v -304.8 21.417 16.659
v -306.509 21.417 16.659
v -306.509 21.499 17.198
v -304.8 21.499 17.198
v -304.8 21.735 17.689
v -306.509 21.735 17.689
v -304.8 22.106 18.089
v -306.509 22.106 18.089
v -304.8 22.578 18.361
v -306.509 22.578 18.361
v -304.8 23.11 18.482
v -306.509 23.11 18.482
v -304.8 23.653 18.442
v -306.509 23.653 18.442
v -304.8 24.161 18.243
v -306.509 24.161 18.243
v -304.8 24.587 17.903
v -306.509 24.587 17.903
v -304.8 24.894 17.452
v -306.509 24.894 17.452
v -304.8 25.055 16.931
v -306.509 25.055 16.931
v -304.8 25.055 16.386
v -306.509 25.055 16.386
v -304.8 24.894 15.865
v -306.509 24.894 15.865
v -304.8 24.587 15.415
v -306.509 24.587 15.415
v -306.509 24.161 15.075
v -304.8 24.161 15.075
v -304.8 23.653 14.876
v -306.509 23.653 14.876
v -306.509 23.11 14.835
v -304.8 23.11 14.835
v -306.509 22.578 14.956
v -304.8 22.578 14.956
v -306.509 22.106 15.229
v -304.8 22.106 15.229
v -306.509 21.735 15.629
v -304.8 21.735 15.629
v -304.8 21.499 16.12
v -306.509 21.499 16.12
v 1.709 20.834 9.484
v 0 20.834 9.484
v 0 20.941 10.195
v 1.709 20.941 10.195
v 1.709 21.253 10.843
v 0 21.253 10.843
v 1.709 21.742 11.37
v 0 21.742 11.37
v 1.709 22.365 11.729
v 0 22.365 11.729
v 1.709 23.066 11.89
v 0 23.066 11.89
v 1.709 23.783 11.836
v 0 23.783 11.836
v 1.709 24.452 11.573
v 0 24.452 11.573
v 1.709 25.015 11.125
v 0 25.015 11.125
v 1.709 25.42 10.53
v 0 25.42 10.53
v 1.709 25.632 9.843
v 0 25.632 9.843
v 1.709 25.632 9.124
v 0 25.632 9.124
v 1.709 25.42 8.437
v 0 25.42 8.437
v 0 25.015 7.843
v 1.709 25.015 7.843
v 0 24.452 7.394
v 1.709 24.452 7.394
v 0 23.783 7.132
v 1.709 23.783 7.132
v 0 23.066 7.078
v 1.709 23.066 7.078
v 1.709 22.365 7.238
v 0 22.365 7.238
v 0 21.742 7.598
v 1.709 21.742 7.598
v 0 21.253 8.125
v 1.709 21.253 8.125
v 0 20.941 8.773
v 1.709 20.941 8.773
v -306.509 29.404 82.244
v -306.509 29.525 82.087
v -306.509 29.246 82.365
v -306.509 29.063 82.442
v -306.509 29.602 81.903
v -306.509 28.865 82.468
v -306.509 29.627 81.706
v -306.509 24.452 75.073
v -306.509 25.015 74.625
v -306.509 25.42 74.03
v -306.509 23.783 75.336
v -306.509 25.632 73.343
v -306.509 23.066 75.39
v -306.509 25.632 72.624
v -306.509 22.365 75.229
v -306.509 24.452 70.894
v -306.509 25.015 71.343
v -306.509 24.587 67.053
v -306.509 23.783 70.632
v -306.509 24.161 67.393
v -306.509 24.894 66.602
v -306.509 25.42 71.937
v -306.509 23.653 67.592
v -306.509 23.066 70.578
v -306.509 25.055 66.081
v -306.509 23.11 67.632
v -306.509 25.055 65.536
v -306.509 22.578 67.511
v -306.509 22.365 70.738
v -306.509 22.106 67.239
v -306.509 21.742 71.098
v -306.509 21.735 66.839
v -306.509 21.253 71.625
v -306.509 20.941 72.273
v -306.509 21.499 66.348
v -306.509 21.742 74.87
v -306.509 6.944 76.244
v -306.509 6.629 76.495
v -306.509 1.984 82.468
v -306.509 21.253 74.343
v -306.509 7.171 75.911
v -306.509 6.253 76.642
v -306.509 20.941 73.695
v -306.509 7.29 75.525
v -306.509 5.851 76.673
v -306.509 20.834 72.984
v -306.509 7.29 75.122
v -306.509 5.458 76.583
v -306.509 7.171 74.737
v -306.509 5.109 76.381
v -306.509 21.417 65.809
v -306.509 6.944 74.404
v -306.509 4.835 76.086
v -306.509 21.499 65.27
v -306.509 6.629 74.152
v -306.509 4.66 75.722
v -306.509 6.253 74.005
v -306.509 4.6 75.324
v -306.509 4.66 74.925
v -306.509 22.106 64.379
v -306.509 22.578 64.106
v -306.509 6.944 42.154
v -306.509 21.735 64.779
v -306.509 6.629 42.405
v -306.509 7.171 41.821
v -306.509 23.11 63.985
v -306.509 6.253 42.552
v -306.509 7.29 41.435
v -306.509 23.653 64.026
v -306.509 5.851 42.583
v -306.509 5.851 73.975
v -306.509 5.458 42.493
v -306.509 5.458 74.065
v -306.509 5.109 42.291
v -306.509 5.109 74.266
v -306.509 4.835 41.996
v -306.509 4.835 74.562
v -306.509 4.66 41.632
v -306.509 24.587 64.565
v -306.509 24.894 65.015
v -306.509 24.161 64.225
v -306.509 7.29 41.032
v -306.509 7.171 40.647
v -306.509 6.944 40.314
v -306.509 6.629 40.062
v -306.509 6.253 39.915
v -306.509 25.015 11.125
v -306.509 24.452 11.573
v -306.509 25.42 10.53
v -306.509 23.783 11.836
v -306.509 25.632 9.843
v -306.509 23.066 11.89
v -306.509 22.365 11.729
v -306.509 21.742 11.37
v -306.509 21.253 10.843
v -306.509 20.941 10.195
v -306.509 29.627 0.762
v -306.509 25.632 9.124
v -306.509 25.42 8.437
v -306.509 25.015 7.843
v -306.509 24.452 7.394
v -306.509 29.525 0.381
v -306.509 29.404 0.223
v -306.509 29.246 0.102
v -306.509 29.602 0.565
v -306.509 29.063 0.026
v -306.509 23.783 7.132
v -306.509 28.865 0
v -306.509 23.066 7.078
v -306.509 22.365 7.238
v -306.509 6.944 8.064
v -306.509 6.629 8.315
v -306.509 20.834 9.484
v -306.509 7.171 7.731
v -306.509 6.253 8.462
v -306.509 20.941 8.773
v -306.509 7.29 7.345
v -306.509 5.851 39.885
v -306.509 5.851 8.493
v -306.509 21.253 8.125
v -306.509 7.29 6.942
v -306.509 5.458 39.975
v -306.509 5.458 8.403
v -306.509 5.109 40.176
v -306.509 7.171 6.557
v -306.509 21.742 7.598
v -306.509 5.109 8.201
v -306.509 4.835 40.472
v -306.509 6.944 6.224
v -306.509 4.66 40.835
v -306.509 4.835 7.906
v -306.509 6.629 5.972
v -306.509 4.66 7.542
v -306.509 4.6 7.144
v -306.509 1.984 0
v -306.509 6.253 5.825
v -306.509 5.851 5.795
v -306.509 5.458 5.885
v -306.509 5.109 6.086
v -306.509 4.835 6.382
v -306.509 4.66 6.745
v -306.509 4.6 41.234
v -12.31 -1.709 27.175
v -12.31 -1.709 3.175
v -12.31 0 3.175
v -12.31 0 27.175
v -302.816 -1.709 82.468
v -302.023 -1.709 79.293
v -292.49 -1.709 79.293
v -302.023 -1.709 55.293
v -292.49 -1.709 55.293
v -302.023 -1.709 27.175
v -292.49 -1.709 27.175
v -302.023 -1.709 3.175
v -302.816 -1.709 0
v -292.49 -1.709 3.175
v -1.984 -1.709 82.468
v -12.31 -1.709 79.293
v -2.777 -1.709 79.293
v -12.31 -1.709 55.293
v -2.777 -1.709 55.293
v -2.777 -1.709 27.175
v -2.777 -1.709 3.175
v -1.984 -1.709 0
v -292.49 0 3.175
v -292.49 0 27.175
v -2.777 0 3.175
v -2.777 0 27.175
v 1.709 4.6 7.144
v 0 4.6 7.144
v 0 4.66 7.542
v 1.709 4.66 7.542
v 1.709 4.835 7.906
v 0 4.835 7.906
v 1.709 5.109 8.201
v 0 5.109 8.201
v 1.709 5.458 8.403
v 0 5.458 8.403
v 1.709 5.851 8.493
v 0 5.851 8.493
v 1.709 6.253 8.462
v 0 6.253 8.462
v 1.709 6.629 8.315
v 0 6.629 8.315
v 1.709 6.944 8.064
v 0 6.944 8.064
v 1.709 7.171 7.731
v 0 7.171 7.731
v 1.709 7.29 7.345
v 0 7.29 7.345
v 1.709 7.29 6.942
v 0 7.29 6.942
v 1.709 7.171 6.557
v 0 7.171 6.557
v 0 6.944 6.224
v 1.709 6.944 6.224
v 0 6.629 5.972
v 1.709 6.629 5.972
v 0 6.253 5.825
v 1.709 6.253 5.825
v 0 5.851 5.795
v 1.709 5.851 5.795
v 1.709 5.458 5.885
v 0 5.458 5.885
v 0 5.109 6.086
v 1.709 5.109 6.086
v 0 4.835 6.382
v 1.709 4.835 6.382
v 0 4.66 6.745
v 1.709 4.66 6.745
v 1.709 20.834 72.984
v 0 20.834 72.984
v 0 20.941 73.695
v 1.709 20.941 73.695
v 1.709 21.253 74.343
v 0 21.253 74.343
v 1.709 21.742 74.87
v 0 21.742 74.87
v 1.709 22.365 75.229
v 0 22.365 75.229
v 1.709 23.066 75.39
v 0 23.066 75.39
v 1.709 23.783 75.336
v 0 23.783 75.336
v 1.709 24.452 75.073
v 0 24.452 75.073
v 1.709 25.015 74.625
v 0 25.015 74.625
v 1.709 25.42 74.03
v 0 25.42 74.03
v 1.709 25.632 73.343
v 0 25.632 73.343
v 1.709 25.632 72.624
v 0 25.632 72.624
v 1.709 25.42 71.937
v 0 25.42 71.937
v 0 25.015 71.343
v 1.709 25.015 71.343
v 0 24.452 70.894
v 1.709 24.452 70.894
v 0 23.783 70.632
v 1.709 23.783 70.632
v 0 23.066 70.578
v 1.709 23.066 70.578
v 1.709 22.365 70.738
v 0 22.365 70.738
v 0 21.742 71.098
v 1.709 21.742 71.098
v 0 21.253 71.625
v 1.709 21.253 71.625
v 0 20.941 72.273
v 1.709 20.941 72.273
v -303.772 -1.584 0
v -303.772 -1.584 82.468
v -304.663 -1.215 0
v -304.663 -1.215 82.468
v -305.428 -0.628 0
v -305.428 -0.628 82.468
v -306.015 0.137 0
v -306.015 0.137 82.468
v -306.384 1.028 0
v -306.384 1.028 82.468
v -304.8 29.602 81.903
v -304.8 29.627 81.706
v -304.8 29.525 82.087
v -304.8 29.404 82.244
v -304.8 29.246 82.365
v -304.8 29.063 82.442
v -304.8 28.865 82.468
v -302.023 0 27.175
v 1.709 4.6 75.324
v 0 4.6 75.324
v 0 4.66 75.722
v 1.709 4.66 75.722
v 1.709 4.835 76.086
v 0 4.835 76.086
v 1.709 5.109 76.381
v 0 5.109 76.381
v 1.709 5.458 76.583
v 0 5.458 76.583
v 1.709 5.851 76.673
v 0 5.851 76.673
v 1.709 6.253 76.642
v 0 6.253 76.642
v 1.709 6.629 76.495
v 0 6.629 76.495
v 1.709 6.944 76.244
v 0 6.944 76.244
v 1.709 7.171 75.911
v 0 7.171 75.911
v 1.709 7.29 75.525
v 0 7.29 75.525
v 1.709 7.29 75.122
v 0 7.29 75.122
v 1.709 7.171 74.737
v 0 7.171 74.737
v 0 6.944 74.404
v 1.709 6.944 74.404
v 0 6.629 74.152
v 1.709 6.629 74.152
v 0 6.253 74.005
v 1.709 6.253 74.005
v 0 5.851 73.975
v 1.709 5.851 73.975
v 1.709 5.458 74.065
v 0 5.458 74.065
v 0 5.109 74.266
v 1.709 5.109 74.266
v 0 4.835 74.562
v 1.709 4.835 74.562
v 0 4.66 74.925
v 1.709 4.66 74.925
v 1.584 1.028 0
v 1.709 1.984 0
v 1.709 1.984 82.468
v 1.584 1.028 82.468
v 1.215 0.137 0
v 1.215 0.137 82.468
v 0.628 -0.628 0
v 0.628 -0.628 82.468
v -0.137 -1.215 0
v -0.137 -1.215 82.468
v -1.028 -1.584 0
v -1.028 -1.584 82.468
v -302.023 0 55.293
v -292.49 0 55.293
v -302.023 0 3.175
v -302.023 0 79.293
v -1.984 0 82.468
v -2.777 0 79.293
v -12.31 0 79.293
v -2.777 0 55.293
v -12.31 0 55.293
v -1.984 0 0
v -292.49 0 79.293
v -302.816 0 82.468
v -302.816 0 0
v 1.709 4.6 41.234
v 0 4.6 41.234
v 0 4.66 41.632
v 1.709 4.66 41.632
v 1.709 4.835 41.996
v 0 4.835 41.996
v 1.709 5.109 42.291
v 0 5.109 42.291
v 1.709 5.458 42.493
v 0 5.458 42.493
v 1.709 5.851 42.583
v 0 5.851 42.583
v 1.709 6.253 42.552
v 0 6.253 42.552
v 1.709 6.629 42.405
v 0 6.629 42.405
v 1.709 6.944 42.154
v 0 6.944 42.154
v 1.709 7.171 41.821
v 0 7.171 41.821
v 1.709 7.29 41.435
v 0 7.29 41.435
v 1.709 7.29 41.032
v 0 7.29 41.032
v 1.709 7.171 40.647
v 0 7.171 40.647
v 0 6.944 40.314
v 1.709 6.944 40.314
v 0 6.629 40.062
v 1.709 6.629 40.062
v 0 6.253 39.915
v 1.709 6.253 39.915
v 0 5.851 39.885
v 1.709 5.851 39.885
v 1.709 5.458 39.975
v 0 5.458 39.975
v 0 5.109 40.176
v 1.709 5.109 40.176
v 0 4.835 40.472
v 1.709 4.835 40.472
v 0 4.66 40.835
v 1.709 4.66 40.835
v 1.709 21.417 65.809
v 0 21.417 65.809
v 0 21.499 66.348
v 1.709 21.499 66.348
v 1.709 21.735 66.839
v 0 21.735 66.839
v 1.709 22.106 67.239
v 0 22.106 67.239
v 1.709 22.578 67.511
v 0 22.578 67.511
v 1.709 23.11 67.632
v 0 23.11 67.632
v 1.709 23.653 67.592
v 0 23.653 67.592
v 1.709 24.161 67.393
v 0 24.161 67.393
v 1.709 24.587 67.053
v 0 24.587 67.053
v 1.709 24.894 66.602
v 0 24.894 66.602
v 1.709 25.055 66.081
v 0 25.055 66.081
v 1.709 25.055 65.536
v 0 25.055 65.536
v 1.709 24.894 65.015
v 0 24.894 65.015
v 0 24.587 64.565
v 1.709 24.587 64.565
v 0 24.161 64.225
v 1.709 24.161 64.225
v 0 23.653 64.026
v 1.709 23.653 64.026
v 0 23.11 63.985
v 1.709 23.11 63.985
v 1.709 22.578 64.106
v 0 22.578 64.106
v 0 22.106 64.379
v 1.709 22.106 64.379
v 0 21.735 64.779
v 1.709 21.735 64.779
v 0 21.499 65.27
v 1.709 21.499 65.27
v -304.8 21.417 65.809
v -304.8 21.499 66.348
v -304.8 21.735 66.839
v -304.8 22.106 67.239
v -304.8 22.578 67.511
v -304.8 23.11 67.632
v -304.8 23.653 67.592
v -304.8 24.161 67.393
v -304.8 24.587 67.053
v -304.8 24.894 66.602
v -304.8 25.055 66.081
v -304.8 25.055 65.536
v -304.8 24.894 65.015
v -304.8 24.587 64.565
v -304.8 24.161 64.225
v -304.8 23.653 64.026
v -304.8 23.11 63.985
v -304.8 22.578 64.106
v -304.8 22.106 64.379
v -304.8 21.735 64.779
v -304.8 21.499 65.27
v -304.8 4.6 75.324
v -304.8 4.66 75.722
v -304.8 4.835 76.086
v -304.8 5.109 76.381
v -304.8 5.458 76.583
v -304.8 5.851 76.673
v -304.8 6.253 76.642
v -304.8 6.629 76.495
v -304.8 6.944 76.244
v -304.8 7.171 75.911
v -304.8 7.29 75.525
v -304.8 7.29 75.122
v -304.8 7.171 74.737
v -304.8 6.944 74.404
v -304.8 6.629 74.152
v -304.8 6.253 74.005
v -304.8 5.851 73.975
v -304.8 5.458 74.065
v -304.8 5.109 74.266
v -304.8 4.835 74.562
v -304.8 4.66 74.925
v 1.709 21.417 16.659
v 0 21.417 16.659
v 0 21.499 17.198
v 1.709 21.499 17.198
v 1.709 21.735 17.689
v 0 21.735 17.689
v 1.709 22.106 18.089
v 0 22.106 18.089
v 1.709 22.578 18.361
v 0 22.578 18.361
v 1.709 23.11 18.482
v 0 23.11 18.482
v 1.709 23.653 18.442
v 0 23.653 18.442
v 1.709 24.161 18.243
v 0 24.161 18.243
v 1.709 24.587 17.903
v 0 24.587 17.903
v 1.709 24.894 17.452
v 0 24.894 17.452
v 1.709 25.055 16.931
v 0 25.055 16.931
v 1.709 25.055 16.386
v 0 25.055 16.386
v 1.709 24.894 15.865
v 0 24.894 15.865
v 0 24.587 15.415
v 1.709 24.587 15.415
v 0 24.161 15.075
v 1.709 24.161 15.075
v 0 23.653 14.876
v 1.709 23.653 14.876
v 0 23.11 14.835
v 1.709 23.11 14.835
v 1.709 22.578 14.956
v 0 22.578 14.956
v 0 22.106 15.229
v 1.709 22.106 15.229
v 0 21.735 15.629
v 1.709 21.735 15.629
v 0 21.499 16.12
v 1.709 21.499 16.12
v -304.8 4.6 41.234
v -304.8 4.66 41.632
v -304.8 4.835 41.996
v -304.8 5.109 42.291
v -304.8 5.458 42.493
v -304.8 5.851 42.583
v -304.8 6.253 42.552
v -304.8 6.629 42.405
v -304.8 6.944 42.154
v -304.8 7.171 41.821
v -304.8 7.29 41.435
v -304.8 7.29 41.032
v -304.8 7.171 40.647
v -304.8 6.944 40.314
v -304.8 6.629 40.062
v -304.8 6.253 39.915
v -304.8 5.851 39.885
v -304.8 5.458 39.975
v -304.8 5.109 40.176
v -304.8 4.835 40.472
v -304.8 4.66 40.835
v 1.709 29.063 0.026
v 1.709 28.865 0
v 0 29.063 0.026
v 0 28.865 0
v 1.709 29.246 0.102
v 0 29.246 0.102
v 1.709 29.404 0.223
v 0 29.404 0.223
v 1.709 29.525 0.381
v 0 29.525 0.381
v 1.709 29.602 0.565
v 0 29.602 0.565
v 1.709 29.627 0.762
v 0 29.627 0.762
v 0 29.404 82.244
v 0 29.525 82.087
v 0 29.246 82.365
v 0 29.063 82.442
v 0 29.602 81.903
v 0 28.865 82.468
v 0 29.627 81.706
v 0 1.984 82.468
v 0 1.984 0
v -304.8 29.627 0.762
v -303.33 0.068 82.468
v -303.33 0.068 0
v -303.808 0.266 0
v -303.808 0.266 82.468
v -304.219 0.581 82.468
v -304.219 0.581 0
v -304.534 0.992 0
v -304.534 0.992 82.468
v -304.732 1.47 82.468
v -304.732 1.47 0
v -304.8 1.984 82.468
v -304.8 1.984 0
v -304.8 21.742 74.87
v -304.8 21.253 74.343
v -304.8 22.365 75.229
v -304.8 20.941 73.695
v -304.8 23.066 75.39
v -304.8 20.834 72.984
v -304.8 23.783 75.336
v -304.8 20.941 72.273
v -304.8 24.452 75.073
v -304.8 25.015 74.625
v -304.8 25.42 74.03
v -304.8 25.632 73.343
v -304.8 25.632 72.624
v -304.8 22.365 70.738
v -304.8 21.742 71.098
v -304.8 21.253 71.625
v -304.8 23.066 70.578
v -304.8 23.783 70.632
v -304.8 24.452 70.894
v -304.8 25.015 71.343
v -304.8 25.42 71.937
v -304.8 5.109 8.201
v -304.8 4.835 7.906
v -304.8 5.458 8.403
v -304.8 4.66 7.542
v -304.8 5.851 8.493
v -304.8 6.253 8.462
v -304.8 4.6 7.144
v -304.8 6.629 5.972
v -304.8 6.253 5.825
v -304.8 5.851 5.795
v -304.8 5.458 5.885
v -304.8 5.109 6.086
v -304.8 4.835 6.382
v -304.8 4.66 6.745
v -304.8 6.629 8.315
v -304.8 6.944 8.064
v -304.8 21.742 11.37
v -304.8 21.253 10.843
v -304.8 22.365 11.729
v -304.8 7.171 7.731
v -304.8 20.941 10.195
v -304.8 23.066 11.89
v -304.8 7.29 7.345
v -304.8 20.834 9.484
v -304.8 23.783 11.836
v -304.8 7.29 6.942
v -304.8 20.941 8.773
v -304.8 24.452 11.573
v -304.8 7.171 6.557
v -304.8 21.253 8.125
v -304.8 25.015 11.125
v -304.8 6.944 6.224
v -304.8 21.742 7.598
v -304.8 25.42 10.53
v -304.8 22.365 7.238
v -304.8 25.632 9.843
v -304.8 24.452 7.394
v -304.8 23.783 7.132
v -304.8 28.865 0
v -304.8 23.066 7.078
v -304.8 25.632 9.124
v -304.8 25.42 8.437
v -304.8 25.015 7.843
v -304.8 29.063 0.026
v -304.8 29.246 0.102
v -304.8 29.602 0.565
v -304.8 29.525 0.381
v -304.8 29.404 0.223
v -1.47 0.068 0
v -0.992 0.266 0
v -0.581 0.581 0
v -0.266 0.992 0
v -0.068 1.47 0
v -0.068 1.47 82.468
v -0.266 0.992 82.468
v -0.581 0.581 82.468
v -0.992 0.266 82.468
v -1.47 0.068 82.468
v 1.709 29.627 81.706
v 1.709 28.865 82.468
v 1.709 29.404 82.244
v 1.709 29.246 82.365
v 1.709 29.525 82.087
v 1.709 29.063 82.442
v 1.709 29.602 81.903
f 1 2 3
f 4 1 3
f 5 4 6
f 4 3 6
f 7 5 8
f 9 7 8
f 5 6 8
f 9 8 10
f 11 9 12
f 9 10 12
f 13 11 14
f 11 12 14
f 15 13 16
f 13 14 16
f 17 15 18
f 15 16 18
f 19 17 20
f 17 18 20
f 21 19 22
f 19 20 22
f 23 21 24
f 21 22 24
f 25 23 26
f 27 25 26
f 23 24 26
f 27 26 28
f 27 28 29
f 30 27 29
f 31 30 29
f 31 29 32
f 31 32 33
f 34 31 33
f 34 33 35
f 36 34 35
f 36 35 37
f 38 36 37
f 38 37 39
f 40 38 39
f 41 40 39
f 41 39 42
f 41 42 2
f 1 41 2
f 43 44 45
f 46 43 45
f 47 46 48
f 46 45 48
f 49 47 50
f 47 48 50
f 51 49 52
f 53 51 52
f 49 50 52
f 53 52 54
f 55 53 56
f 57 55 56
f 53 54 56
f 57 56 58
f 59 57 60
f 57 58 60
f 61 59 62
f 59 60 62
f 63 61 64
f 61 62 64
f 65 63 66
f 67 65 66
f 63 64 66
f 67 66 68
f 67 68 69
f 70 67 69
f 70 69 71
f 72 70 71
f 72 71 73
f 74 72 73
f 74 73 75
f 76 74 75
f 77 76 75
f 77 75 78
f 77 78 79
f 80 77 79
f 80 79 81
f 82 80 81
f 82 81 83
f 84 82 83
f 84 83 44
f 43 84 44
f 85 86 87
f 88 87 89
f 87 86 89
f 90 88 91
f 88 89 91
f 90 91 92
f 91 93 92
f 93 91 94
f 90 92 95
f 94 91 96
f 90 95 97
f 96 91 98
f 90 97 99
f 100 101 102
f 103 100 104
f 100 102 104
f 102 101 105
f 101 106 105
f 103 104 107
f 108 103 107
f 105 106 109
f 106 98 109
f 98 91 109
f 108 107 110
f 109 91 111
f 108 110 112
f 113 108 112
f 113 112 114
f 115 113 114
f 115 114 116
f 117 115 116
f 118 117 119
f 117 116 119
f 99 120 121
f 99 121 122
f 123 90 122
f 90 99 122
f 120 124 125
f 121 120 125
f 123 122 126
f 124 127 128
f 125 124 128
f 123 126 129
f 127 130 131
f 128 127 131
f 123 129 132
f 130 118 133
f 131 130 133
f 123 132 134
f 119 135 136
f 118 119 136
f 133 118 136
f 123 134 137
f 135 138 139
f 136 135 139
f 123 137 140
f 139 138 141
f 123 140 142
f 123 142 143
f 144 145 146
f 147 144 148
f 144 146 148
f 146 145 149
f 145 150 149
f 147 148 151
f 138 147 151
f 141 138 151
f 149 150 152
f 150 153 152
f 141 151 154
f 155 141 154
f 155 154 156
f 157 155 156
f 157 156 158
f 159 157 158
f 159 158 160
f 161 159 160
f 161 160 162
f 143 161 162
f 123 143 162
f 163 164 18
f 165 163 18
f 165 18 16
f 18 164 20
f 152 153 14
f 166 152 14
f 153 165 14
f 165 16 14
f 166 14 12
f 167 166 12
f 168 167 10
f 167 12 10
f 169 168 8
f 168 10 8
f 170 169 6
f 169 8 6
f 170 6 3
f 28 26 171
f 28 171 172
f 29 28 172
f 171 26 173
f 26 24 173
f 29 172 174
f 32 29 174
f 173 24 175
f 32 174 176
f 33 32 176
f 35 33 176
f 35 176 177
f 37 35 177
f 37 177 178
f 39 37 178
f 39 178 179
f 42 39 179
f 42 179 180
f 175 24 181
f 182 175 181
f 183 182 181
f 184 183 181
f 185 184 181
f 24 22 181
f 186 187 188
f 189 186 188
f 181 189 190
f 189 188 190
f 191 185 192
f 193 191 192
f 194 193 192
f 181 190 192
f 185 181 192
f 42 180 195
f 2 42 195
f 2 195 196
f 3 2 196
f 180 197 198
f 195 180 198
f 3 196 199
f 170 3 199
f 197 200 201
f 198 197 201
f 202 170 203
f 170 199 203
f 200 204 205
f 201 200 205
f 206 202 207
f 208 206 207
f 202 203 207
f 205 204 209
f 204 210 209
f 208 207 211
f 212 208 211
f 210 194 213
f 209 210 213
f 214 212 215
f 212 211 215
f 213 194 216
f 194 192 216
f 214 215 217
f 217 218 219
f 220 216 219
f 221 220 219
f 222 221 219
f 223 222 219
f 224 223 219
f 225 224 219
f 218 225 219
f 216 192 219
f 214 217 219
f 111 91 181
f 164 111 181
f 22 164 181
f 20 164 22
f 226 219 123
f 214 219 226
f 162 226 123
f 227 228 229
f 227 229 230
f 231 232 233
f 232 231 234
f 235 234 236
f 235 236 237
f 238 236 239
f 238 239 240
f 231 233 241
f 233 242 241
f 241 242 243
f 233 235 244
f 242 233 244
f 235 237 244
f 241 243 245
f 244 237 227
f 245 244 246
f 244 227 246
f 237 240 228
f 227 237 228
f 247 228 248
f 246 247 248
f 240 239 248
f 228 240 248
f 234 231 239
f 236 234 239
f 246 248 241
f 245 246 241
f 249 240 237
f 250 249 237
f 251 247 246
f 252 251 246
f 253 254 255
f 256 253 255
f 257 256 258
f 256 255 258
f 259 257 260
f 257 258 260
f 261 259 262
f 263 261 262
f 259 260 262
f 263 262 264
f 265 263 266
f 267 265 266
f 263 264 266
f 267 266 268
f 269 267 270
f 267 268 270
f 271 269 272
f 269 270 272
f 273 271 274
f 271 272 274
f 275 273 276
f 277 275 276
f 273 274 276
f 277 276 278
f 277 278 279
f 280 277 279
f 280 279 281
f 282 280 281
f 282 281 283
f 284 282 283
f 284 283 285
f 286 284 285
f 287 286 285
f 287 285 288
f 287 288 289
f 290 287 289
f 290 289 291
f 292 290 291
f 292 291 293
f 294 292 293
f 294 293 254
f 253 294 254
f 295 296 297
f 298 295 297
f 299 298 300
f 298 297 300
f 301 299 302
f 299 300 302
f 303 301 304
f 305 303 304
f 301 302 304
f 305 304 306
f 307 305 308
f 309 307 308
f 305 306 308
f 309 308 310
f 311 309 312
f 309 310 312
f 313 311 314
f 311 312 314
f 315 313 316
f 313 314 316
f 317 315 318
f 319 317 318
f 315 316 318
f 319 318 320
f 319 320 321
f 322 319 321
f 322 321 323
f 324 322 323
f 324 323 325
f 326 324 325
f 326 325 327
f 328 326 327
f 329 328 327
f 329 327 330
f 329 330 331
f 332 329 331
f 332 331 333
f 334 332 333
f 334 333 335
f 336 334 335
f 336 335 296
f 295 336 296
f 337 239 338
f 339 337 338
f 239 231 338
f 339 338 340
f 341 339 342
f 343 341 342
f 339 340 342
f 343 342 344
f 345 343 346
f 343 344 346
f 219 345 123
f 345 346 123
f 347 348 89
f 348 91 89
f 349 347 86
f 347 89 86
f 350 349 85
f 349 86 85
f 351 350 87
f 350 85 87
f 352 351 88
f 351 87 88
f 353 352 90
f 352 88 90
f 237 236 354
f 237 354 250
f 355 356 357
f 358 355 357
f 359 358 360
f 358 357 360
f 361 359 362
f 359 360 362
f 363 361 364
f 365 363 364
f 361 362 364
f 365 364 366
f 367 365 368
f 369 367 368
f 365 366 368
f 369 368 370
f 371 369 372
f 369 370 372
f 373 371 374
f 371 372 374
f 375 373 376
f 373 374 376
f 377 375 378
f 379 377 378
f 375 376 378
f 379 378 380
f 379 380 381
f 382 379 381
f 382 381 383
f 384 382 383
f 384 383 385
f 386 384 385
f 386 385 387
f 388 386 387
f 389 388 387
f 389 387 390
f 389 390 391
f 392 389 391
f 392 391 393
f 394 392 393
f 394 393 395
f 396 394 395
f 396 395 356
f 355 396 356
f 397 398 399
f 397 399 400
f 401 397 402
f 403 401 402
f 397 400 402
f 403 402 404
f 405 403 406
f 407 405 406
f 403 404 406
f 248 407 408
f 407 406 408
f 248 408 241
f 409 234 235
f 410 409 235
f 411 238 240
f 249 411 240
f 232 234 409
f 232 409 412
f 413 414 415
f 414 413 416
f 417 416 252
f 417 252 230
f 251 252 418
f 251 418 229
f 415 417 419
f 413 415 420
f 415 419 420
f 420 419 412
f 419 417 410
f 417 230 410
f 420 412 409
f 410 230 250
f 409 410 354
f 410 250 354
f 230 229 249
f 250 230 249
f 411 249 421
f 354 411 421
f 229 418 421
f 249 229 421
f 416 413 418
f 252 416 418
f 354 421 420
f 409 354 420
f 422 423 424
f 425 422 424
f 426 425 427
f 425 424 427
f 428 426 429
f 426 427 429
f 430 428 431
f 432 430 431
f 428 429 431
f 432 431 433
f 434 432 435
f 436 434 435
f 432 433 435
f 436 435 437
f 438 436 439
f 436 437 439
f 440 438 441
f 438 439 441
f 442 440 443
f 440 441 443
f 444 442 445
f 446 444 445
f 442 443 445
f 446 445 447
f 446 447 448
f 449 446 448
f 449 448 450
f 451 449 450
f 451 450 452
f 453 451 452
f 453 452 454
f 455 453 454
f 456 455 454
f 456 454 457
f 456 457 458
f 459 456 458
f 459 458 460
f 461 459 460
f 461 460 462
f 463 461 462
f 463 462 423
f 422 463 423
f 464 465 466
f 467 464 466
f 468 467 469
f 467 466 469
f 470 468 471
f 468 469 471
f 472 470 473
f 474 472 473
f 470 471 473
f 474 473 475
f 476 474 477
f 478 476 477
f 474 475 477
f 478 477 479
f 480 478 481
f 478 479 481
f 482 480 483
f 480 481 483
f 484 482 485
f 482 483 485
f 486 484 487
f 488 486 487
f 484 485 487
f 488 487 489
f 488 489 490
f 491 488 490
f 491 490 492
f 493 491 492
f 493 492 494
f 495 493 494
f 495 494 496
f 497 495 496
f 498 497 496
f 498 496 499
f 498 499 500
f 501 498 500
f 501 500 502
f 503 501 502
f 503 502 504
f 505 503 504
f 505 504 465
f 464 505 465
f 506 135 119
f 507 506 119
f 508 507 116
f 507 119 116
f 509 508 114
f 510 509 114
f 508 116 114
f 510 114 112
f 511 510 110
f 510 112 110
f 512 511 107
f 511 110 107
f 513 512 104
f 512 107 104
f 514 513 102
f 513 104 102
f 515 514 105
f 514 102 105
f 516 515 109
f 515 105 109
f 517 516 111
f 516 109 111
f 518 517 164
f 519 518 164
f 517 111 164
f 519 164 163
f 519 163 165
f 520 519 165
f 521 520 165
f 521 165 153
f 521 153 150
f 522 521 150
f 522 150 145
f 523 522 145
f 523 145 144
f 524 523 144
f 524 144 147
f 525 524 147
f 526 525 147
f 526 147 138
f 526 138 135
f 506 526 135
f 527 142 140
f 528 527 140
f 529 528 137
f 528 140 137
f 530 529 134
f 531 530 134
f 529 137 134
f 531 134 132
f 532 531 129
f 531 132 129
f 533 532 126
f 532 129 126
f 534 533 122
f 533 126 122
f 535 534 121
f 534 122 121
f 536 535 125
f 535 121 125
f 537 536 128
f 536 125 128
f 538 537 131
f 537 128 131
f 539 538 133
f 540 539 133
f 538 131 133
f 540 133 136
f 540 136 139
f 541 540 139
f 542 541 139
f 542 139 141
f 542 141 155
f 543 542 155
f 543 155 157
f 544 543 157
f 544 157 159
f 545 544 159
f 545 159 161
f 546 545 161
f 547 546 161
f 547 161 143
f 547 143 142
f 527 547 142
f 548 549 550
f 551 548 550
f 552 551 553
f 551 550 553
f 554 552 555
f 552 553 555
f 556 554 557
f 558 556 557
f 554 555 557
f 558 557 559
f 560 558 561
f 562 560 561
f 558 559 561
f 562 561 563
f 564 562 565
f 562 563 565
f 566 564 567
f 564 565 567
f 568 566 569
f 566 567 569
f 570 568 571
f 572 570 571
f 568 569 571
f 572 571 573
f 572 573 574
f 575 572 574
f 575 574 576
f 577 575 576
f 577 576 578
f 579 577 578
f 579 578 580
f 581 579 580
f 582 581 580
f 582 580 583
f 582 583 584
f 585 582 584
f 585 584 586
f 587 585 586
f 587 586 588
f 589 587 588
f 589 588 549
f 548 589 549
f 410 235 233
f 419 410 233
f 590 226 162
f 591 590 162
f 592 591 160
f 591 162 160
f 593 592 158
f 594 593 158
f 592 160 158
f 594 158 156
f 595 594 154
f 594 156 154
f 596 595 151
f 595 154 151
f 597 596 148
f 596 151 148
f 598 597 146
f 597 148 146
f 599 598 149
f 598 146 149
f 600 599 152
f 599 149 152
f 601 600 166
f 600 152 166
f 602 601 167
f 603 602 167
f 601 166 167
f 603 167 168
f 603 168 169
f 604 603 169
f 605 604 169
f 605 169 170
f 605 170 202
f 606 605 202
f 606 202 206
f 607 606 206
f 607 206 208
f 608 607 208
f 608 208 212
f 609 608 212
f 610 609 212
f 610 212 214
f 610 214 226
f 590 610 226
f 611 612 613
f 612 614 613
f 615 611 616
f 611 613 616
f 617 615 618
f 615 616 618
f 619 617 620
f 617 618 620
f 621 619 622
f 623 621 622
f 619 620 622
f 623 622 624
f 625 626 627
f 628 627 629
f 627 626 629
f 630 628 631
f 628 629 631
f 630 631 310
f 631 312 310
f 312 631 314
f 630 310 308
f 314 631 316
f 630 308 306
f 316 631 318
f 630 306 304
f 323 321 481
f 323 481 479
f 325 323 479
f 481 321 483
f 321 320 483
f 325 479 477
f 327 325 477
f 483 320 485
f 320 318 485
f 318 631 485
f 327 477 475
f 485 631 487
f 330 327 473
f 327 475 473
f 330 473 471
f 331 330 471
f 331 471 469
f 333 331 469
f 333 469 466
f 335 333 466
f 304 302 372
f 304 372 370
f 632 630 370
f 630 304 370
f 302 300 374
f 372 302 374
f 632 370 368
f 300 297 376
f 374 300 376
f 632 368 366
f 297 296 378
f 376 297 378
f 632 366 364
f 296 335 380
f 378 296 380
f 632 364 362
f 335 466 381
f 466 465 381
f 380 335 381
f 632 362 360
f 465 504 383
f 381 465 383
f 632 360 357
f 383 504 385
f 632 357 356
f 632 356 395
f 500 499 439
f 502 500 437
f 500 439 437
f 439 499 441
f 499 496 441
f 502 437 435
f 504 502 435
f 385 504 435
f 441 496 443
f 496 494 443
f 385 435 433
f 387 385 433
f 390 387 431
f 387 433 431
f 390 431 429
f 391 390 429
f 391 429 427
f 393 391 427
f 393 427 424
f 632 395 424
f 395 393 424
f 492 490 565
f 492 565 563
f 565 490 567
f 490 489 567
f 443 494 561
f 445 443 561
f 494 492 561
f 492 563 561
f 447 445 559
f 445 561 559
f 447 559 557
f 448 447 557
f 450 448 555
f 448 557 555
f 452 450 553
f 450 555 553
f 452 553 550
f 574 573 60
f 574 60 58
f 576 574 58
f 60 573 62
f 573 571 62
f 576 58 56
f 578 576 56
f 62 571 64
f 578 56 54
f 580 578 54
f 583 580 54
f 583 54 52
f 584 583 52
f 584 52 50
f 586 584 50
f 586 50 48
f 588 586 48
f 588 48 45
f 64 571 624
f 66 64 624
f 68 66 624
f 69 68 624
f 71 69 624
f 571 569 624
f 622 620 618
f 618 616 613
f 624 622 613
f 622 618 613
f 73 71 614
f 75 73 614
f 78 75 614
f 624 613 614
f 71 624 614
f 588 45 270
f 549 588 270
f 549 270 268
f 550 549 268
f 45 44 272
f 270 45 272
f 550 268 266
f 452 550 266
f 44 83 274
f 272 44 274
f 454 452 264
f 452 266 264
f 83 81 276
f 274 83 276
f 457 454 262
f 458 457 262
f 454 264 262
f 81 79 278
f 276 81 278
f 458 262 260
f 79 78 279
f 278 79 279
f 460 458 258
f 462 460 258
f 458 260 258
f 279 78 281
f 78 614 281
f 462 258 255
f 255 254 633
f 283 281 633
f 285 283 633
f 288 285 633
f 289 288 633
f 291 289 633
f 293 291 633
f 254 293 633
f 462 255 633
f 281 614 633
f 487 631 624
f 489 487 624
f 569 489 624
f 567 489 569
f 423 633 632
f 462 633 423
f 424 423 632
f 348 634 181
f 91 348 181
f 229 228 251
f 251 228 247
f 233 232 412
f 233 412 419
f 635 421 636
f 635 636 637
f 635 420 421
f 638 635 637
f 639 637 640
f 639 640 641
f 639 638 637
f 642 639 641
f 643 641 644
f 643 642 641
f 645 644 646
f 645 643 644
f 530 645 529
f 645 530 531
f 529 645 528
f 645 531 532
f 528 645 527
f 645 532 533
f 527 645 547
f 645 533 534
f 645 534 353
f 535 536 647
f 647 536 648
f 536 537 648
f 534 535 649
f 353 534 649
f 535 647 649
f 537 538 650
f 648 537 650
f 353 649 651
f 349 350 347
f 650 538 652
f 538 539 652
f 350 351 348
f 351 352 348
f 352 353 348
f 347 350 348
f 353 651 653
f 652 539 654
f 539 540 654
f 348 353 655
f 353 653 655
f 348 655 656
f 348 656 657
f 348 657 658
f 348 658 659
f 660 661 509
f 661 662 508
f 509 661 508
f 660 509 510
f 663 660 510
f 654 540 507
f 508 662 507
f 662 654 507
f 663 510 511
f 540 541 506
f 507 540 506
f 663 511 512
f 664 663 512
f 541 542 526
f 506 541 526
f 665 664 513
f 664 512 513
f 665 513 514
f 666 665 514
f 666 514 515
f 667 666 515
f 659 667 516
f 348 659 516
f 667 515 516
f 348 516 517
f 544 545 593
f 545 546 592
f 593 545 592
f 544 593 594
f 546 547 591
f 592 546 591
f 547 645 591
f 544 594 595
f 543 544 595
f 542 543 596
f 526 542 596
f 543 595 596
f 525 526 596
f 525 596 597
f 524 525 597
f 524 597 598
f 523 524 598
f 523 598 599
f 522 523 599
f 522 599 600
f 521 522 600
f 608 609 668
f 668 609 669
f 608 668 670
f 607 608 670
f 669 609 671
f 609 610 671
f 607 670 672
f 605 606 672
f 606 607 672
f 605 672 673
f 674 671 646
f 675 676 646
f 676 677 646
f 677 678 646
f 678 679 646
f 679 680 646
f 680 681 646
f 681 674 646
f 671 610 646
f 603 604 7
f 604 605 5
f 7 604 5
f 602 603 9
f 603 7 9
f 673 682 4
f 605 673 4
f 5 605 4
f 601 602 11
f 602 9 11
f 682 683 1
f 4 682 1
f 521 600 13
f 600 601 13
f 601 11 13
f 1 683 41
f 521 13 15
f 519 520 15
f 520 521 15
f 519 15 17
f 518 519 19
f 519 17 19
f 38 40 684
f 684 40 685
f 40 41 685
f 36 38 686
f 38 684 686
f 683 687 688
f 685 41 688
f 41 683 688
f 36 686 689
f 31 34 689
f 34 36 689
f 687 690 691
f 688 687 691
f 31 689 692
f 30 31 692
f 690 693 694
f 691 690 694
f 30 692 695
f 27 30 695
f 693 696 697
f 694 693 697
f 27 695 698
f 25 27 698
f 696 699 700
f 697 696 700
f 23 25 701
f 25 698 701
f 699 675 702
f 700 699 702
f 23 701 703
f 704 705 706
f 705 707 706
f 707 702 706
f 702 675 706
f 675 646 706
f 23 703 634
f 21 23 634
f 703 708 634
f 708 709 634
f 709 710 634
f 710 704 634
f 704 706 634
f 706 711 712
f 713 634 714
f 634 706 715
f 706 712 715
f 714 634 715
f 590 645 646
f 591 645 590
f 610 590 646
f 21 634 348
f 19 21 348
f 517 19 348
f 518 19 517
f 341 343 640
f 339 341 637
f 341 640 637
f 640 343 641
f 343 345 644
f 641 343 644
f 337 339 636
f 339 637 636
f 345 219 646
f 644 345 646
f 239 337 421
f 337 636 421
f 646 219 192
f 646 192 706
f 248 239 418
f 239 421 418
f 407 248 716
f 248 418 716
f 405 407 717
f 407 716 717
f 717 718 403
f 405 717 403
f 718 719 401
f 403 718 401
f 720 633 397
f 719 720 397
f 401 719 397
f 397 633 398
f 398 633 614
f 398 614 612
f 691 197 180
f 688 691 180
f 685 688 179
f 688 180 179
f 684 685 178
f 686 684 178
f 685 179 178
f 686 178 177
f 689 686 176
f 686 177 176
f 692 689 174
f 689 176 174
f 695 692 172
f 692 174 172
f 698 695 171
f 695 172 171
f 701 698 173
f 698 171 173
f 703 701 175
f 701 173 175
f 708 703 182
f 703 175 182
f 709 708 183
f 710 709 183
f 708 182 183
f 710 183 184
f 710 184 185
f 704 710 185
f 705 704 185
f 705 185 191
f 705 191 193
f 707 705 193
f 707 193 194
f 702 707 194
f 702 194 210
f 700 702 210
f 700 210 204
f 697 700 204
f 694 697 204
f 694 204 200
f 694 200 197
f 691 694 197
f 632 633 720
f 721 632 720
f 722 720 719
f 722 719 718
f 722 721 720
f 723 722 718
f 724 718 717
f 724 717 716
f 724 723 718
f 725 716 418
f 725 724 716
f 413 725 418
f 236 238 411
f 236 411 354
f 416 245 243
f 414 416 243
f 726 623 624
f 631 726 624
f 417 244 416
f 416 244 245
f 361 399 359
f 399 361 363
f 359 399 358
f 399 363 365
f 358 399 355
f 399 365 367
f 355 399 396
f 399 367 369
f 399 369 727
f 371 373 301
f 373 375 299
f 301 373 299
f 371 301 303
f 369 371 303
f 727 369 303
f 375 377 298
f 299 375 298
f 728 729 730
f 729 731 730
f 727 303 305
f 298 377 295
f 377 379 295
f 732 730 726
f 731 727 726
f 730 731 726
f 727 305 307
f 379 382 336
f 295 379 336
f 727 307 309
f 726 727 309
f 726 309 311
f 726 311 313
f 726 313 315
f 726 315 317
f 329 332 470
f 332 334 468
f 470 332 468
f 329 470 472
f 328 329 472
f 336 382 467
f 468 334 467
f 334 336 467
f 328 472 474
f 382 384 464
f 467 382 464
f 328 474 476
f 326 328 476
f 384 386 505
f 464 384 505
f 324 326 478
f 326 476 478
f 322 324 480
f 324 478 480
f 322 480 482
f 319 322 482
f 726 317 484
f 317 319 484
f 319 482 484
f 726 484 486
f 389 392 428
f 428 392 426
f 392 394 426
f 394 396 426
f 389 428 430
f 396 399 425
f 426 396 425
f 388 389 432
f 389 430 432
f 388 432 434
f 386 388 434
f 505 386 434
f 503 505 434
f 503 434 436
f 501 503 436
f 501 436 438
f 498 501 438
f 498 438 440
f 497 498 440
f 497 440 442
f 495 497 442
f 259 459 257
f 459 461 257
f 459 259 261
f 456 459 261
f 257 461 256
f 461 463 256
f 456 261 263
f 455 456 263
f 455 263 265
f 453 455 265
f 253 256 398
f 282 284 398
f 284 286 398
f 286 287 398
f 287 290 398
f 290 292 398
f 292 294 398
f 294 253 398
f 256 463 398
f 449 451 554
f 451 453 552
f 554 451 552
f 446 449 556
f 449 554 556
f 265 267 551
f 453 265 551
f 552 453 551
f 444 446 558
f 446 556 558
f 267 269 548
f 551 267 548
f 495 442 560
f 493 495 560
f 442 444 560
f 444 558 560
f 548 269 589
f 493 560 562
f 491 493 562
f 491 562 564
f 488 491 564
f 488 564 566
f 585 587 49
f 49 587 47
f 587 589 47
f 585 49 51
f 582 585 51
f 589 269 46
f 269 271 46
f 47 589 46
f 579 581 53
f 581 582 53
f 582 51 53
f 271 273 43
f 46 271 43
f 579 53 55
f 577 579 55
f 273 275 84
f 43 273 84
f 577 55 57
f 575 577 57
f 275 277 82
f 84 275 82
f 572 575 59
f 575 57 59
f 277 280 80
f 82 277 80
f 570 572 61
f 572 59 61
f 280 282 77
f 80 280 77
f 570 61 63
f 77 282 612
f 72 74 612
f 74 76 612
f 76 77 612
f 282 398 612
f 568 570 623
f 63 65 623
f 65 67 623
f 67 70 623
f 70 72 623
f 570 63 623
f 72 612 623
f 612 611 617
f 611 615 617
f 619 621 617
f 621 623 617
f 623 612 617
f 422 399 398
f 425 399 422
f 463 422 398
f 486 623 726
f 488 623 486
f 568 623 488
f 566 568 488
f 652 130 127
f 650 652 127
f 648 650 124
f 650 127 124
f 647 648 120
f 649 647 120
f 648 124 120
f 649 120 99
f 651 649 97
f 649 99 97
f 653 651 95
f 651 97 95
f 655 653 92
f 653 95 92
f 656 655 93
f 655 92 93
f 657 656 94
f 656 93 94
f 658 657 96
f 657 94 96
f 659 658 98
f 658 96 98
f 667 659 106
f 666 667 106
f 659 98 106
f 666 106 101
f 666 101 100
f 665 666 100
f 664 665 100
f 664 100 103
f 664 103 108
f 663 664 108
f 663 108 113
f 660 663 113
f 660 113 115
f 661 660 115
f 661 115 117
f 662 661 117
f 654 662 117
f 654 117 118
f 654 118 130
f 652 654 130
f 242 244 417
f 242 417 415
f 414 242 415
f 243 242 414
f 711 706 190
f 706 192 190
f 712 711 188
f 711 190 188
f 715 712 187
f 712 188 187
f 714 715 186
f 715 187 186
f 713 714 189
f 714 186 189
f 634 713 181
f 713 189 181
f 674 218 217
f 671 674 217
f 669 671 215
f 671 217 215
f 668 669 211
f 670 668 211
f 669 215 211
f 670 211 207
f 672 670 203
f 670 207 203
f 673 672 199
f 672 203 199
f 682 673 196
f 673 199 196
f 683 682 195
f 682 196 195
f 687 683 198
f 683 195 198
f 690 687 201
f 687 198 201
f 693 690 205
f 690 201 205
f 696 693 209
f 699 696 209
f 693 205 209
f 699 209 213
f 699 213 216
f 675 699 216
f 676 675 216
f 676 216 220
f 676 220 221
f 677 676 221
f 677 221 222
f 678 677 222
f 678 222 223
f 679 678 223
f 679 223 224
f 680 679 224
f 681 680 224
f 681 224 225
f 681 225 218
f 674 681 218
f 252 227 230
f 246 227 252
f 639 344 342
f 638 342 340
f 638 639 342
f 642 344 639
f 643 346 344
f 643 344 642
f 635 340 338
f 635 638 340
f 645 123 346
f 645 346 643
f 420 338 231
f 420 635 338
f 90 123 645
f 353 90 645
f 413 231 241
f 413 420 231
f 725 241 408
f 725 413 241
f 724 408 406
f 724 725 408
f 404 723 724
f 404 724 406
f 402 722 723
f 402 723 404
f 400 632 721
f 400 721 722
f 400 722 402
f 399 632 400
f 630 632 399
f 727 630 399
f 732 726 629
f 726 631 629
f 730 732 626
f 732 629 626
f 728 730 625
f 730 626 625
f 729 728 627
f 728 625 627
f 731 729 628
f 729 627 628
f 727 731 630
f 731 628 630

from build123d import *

# Parameters (mm, degrees)
F1_DEPTH = 82.467501
F2_R     = 1.98374
F3_R     = 3.69316
F4_R     = 2.4125
F4_R_2   = 1.8288
F4_R_3   = 1.35255
F5_DEPTH = 308.21884
F6_W     = 9.532925
F6_H     = 24
F7_DEPTH = 31.336894
F8_R     = 0.762


with BuildPart() as f1:
    # F0 (on Top) → F1 (new body)
    with BuildSketch(Plane.XY):
        Polygon((0, 29.627474), (0, 0), (-304.8, 0), (-304.8, 29.627474), (-306.50942, 29.627474), (-306.50942, -1.70942), (1.70942, -1.70942), (1.70942, 29.627474), align=None)
    extrude(amount=F1_DEPTH)

    # F2
    f2_edges = [f1.edges().sort_by_distance(p)[0] for p in [
        (0, 0, 41.23375),
        (-304.8, 0, 41.23375),
    ]]
    fillet(f2_edges, radius=F2_R)

    # F3
    f3_edges = [f1.edges().sort_by_distance(p)[0] for p in [
        (1.70942, -1.70942, 41.23375),
        (-306.50942, -1.70942, 41.23375),
    ]]
    fillet(f3_edges, radius=F3_R)

    # F4 (on face) → F5 (cut, through all)
    with BuildSketch(Plane(origin=(-306.50942, 0, 0), x_dir=(0, -1, 0), z_dir=(-1, 0, 0))):
        with Locations((-23.246224, 9.483746)):
            Circle(F4_R)
        with Locations((-23.246224, 72.983755)):
            Circle(F4_R)
        with Locations((-23.246224, 65.808755)):
            Circle(F4_R_2)
        with Locations((-23.246224, 16.658746)):
            Circle(F4_R_2)
        with Locations((-5.95249, 7.14375)):
            Circle(F4_R_3)
        with Locations((-5.95249, 75.323751)):
            Circle(F4_R_3)
        with Locations((-5.95249, 41.23375)):
            Circle(F4_R_3)
    extrude(amount=-F5_DEPTH, mode=Mode.SUBTRACT)

    # F6 (on face) → F7 (cut, through all)
    with BuildSketch(Plane.XZ.offset(1.70942)):
        with Locations((-7.543952, 15.175)):
            Rectangle(F6_W, F6_H)
        with Locations((-7.543952, 67.292501)):
            Rectangle(F6_W, F6_H)
        with Locations((-297.256048, 67.292501)):
            Rectangle(F6_W, F6_H)
        with Locations((-297.256048, 15.175)):
            Rectangle(F6_W, F6_H)
    extrude(amount=-F7_DEPTH, mode=Mode.SUBTRACT)

    # F8
    f8_edges = [f1.edges().sort_by_distance(p)[0] for p in [
        (0.85471, 29.627474, 82.467501),
        (0.85471, 29.627474, 0),
        (-305.65471, 29.627474, 0),
        (-305.65471, 29.627474, 82.467501),
    ]]
    fillet(f8_edges, radius=F8_R)


solid = f1.part
